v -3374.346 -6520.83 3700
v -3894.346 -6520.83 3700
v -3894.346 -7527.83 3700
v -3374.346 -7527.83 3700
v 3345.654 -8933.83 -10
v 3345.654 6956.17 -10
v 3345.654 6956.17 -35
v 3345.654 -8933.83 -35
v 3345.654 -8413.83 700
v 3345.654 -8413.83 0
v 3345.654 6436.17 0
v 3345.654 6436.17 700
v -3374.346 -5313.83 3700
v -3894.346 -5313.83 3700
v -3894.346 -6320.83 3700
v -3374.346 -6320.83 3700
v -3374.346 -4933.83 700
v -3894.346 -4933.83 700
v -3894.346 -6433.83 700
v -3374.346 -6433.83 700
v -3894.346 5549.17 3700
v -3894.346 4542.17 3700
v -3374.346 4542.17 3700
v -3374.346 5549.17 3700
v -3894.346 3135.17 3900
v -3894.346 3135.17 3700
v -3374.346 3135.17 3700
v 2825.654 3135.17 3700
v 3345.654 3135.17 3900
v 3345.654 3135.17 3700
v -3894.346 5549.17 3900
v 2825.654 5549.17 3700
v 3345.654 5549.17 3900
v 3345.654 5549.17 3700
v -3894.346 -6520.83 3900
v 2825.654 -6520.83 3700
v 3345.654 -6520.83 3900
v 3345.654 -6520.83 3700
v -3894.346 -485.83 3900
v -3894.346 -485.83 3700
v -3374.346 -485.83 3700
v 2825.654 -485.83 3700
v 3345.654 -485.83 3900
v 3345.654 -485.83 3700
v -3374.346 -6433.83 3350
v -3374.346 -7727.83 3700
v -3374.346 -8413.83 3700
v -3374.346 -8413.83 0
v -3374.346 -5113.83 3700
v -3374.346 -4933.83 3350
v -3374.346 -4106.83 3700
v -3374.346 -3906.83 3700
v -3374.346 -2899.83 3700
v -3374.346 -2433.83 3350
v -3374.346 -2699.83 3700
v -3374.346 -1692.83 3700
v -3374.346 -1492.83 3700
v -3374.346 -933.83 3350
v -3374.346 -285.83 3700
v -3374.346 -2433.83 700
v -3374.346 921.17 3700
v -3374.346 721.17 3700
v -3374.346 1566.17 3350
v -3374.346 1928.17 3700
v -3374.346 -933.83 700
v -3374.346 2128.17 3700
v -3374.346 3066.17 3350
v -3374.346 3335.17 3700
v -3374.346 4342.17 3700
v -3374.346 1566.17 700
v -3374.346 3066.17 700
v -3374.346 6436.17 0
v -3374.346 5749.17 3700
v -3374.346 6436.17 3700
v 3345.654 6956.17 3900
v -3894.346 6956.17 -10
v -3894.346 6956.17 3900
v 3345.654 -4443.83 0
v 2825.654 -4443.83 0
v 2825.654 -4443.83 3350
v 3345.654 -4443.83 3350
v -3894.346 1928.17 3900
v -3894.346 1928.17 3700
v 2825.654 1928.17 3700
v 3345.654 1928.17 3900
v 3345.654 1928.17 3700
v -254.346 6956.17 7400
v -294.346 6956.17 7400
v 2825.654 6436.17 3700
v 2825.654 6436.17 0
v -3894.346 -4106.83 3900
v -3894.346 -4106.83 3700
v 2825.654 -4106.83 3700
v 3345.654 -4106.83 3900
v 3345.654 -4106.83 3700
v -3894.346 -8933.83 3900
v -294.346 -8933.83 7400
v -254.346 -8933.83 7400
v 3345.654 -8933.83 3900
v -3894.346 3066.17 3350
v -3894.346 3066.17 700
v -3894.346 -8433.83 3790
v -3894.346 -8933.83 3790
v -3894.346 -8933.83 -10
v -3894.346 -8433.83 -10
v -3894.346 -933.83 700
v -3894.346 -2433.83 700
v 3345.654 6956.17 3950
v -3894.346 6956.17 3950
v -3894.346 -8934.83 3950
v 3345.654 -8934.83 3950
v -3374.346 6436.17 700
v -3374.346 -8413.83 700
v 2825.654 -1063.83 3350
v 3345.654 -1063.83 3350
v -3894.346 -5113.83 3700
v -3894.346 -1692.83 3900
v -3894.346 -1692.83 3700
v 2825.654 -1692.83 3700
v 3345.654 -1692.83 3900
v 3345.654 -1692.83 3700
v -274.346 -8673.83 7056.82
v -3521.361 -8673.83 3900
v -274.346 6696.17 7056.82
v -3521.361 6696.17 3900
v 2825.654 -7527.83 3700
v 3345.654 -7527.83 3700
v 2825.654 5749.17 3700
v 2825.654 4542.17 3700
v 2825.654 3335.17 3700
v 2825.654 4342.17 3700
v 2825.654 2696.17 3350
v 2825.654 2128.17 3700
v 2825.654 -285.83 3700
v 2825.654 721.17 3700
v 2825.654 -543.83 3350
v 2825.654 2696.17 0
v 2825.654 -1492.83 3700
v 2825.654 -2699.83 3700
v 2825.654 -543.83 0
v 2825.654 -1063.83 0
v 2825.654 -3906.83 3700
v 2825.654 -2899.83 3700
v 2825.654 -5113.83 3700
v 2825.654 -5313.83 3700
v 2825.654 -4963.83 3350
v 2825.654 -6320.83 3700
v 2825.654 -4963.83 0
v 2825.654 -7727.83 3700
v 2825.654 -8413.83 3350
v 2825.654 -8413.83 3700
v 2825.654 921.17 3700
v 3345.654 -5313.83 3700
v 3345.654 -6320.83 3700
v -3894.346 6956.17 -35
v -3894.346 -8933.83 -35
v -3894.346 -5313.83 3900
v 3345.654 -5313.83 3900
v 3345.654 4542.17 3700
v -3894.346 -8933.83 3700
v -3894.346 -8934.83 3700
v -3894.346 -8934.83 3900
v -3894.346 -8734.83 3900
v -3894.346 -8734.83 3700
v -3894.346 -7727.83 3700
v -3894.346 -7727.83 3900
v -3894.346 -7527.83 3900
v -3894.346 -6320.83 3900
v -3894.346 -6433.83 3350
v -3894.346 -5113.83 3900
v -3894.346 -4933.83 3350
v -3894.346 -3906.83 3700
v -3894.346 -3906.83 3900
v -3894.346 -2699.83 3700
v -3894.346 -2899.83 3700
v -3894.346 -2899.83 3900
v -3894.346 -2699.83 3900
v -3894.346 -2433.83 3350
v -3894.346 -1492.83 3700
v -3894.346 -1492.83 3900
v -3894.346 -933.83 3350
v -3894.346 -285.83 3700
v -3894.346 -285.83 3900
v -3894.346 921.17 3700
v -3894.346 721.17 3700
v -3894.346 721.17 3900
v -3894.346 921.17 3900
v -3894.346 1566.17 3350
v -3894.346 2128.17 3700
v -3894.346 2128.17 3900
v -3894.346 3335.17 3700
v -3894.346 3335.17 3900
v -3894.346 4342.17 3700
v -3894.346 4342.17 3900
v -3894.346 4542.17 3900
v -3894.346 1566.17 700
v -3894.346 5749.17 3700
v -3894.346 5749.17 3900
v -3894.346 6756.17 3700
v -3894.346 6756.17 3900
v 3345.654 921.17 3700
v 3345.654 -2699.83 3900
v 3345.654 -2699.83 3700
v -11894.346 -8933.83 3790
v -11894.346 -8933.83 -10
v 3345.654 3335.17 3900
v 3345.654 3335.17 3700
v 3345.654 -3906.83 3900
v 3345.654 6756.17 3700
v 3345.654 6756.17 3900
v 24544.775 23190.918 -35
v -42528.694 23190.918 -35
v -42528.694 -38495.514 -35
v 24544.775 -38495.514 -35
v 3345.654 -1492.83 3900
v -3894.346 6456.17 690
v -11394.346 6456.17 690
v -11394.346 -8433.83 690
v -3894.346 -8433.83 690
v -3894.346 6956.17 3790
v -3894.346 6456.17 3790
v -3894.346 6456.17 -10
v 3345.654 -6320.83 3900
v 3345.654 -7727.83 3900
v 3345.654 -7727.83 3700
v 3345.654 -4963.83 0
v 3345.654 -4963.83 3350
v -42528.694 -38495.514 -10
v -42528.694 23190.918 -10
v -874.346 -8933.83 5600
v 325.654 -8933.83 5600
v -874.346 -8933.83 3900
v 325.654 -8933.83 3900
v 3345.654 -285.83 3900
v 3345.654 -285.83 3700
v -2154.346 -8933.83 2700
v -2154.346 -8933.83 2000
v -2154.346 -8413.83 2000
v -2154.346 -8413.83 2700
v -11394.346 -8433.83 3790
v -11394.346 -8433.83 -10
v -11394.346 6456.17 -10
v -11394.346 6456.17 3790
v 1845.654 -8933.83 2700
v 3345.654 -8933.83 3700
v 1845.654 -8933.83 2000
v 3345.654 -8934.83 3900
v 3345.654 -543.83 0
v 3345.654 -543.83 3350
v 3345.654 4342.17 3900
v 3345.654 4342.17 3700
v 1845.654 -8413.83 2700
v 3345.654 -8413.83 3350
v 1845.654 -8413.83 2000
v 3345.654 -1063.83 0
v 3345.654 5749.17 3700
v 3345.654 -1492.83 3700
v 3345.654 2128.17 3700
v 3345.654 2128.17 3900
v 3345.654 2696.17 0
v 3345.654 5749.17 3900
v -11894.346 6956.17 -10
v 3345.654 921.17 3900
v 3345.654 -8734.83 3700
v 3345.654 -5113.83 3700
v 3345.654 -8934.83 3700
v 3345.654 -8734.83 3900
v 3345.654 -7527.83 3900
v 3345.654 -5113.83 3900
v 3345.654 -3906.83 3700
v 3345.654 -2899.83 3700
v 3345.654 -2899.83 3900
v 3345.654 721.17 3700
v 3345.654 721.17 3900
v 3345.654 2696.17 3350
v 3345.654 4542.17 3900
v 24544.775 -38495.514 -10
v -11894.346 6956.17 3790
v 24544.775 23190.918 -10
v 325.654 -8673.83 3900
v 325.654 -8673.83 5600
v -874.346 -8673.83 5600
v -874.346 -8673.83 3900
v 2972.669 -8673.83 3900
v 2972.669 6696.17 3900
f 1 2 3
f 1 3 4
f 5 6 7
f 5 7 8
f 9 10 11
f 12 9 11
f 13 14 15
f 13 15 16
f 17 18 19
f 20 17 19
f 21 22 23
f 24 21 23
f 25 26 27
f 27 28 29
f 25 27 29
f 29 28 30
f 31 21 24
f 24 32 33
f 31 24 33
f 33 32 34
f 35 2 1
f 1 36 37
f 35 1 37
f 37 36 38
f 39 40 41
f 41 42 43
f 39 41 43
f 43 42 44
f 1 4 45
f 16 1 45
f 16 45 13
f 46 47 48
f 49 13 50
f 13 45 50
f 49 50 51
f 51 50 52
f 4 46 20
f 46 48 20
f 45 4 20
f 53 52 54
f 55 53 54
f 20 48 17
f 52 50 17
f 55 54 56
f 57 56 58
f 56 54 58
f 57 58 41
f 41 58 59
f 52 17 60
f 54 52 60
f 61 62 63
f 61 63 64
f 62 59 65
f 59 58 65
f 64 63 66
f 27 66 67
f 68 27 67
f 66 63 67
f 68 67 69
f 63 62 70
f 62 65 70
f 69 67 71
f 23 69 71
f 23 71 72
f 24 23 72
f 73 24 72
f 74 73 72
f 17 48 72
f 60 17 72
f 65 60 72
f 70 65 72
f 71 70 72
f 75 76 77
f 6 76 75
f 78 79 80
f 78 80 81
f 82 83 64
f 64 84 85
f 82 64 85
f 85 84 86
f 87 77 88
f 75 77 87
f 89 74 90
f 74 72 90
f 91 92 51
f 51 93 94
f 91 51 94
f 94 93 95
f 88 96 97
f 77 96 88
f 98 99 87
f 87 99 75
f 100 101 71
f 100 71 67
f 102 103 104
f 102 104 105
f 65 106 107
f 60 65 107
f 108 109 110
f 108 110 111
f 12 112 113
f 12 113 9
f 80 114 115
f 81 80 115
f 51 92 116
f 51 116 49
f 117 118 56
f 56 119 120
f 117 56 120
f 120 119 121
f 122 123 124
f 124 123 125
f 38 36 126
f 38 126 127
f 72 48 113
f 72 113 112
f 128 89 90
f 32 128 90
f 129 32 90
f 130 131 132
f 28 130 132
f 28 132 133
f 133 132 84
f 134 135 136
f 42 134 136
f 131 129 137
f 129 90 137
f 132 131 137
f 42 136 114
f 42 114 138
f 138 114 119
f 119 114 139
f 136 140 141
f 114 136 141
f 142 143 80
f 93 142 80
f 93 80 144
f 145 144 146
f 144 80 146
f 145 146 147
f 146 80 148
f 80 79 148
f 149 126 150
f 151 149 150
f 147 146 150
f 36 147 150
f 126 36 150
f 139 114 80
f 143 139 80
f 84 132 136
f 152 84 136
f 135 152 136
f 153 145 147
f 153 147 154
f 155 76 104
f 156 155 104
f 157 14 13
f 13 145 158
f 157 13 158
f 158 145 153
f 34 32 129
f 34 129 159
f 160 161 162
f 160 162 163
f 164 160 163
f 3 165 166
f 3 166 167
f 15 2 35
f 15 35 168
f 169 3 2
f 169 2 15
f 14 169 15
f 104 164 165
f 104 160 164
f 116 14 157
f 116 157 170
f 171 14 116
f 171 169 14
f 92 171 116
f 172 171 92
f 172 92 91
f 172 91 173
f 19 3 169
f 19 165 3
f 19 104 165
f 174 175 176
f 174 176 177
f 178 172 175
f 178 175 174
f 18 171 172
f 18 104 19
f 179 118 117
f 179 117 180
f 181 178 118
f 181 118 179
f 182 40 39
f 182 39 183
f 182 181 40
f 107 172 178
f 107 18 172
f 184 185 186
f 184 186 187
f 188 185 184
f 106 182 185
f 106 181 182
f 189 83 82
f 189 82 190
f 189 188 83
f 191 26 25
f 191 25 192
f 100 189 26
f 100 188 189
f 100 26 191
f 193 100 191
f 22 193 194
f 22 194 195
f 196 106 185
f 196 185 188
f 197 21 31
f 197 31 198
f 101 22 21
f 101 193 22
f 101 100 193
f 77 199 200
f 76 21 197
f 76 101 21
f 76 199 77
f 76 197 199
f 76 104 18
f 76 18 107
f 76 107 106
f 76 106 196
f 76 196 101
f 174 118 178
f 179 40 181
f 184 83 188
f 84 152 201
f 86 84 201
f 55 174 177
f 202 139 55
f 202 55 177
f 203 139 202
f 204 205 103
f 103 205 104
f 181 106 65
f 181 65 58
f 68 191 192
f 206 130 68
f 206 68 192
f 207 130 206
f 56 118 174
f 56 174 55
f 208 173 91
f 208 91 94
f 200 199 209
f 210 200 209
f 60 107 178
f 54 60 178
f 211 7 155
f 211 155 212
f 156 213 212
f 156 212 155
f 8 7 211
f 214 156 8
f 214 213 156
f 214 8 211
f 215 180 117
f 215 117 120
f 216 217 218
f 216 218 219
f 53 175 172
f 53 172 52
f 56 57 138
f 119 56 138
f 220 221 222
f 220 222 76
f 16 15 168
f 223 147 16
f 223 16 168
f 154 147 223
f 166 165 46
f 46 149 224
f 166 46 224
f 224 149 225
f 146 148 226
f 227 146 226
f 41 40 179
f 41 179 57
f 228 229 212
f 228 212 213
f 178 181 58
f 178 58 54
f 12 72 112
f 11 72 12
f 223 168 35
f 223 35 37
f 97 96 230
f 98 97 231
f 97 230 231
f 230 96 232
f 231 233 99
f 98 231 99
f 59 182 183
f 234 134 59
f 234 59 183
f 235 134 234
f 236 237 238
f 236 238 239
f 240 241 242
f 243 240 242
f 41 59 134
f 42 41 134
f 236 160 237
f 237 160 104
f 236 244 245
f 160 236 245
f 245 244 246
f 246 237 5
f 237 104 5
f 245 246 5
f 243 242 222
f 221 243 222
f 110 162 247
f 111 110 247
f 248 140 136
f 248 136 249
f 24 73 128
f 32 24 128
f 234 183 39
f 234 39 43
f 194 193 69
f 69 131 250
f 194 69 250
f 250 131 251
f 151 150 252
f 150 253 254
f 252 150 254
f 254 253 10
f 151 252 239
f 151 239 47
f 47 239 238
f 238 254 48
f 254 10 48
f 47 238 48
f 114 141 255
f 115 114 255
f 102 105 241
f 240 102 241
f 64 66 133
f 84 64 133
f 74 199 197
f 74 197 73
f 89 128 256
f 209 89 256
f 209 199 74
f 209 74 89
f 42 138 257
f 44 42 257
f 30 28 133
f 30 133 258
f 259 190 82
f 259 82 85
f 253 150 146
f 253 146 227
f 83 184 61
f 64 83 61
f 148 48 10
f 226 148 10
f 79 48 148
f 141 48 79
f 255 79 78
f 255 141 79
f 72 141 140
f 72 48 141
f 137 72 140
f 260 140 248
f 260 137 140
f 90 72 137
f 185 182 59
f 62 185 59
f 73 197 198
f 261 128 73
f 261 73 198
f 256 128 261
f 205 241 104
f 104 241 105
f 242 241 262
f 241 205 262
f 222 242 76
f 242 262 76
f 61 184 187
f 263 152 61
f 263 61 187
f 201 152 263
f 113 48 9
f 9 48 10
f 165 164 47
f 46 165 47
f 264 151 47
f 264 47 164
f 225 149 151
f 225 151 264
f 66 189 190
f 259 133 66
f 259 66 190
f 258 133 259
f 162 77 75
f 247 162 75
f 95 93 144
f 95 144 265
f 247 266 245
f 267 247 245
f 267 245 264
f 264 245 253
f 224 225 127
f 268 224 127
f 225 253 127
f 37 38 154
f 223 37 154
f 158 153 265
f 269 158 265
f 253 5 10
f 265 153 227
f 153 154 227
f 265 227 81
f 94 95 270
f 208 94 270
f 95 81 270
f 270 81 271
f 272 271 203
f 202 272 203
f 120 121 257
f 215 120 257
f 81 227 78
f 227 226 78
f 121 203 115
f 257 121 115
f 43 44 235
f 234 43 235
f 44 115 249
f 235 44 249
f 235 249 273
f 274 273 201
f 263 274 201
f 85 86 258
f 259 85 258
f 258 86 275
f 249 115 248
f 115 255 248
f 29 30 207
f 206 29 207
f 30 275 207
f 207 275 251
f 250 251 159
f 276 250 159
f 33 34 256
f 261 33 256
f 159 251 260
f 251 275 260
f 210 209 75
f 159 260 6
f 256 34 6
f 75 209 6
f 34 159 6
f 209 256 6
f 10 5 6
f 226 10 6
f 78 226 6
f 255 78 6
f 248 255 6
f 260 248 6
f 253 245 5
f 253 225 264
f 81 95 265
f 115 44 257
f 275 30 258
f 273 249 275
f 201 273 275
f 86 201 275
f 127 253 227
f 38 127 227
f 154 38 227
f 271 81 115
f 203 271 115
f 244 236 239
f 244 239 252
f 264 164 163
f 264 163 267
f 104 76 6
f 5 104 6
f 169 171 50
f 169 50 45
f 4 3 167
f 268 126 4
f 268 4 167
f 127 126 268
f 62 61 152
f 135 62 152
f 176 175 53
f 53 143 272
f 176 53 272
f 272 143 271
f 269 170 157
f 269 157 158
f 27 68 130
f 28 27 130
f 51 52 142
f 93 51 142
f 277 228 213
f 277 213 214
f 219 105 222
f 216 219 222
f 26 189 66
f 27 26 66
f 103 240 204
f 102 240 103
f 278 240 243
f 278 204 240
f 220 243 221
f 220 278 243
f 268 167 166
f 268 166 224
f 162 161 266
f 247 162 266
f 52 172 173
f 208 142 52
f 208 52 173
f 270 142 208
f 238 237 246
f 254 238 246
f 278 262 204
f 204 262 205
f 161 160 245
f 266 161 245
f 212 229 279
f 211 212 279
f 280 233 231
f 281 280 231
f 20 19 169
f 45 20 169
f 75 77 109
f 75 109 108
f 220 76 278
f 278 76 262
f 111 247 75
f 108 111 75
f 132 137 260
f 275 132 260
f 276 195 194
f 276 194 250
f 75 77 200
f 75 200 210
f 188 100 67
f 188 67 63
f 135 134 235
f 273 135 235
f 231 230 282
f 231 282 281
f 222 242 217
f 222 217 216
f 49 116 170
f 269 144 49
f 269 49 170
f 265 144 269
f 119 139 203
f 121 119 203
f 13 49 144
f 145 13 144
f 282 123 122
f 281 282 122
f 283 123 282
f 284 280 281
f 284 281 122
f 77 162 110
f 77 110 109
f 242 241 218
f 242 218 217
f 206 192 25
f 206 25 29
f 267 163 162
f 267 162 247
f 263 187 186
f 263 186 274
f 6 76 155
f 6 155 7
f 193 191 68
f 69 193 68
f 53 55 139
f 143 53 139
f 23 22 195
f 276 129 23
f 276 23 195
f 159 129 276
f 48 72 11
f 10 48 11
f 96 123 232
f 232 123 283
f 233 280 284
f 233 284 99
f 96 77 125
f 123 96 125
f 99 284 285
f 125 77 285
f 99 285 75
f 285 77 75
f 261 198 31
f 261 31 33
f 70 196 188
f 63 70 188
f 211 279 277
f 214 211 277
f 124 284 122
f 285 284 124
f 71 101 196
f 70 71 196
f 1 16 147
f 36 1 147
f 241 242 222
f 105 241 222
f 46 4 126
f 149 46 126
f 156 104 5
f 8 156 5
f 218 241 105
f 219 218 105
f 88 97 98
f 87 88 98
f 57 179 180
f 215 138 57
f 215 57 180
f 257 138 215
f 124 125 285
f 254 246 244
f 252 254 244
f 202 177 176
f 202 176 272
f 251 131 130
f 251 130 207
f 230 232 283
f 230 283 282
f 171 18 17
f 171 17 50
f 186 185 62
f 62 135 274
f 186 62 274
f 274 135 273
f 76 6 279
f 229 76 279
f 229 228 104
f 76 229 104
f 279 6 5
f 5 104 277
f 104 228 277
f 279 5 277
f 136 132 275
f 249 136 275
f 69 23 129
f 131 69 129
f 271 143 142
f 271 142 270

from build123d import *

# Parameters (mm, degrees)
F0_W      = 520
F0_H      = 3240
F0_H_2    = 520
F0_H_3    = 3380
F0_H_4    = 3450
F1_DEPTH  = 10
F2_DEPTH  = 3350
F3_W      = 520
F3_H      = 11110
F4_DEPTH  = 350
F5_W      = 7240
F5_H      = 200
F6_DEPTH  = 200
F7_W      = 7240
F7_H      = 15890
F8_DEPTH  = 3500
F9_SIZE2  = 3499.99999
F9_SIZE   = 3599.99999
F10_T     = 260
F11_W     = 1200
F11_H     = 1700
F12_DEPTH = 260
F13_W     = 6720
F13_H     = 14850
F14_DEPTH = 700
F15_W     = 7240
F15_H     = 15891
F16_DEPTH = 50
F17_W     = 1500
F17_H     = 2650
F18_DEPTH = 520
F19_W     = 4000
F19_H     = 700
F20_DEPTH = 520
F21_W     = 67073.4691619873
F21_H     = 61686.4318847656
F21_W_2   = 7240
F21_H_2   = 15890
F22_DEPTH = 25
F24_DEPTH = 3800
F25_W     = 7500
F25_H     = 14890
F26_DEPTH = 700


# Not quite as in the source:
# - a fillet or chamfer is up to 0.001 mm smaller than in the source, because OpenCascade refuses the exact size
# - a shell that OpenCascade refuses in one call is made with other operations: the cavity is built on its own and cut out
# - a feature names something its author has since deleted; it is built from what else it names


with BuildPart() as f1:
    # F0 (on Top) → F1 (new body)
    with BuildSketch(Plane.XY):
        Polygon((-3374.345998764, -8413.8299859681), (-3374.345998764, 6436.1700140319), (2825.654001236, 6436.1700140319), (2825.654001236, 2696.170014032), (3345.654001236, 2696.170014032), (3345.654001236, 6956.1700140319), (-3894.345998764, 6956.1700140319), (-3894.345998764, -8933.8299859681), (3345.654001236, -8933.8299859681), (3345.654001236, -8413.8299859681), (2825.654001236, -8413.8299859681), align=None)
        Polygon((2825.654001236, 6436.1700140319), (-3374.345998764, 6436.1700140319), (-3374.345998764, -8413.8299859681), (2825.654001236, -8413.8299859681), (2825.654001236, -4963.8299859681), (2825.654001236, -4443.829985968), (2825.654001236, -1063.8299859681), (2825.654001236, -543.829985968), (2825.654001236, 2696.170014032), align=None)
        with Locations((3085.654001236, 1076.170014032)):
            Rectangle(F0_W, F0_H)
        with Locations((3085.654001236, -803.829985968)):
            Rectangle(F0_W, F0_H_2)
        with Locations((3085.654001236, -2753.829985968)):
            Rectangle(F0_W, F0_H_3)
        with Locations((3085.654001236, -6688.8299859681)):
            Rectangle(F0_W, F0_H_4)
        with Locations((3085.654001236, -4703.8299859681)):
            Rectangle(F0_W, F0_H_2)
    extrude(amount=-F1_DEPTH)

    # F0 (on Top) → F2 (join)
    with BuildSketch(Plane.XY):
        with Locations((3085.654001236, -803.829985968)):
            Rectangle(F0_W, F0_H_2)
        with Locations((3085.654001236, -4703.8299859681)):
            Rectangle(F0_W, F0_H_2)
        Polygon((-3374.345998764, -8413.8299859681), (-3374.345998764, 6436.1700140319), (2825.654001236, 6436.1700140319), (2825.654001236, 2696.170014032), (3345.654001236, 2696.170014032), (3345.654001236, 6956.1700140319), (-3894.345998764, 6956.1700140319), (-3894.345998764, -8933.8299859681), (3345.654001236, -8933.8299859681), (3345.654001236, -8413.8299859681), (2825.654001236, -8413.8299859681), align=None)
    extrude(amount=F2_DEPTH)

    # F3 (on face) → F4 (join)
    with BuildSketch(Plane.XY.offset(3350)):
        Polygon((3345.654001236, 6956.1700140319), (-3894.345998764, 6956.1700140319), (-3894.345998764, -8933.8299859681), (3345.654001236, -8933.8299859681), (3345.654001236, -8413.8299859681), (2825.654001236, -8413.8299859681), (-3374.345998764, -8413.8299859681), (-3374.345998764, 6436.1700140319), (2825.654001236, 6436.1700140319), (2825.654001236, 2696.170014032), (3345.654001236, 2696.170014032), align=None)
        with Locations((3085.654001236, -2858.8299859681)):
            Rectangle(F3_W, F3_H)
    extrude(amount=F4_DEPTH)

    # F5 (on face) → F6 (join)
    with BuildSketch(Plane.XY.offset(3700)):
        with Locations((-274.345998764, 6856.1700140319)):
            Rectangle(F5_W, F5_H)
        with Locations((-274.345998764, 5649.1700140319)):
            Rectangle(F5_W, F5_H)
        with Locations((-274.345998764, 4442.1700140319)):
            Rectangle(F5_W, F5_H)
        with Locations((-274.345998764, 3235.1700140319)):
            Rectangle(F5_W, F5_H)
        with Locations((-274.345998764, 2028.1700140319)):
            Rectangle(F5_W, F5_H)
        with Locations((-274.345998764, 821.1700140319)):
            Rectangle(F5_W, F5_H)
        with Locations((-274.345998764, -385.8299859681)):
            Rectangle(F5_W, F5_H)
        with Locations((-274.345998764, -1592.8299859681)):
            Rectangle(F5_W, F5_H)
        with Locations((-274.345998764, -2799.8299859681)):
            Rectangle(F5_W, F5_H)
        with Locations((-274.345998764, -4006.8299859681)):
            Rectangle(F5_W, F5_H)
        with Locations((-274.345998764, -5213.8299859681)):
            Rectangle(F5_W, F5_H)
        with Locations((-274.345998764, -6420.8299859681)):
            Rectangle(F5_W, F5_H)
        with Locations((-274.345998764, -7627.8299859681)):
            Rectangle(F5_W, F5_H)
        with Locations((-274.345998764, -8834.8299859681)):
            Rectangle(F5_W, F5_H)
    extrude(amount=F6_DEPTH)

    # F17 (on face) → F18 (cut)
    with BuildSketch(Plane(origin=(-3894.345998764, 0, 0), x_dir=(0, -1, 0), z_dir=(-1, 0, 0))):
        with Locations((5683.8299859681, 2025)):
            Rectangle(F17_W, F17_H)
        with Locations((1683.8299859681, 2025)):
            Rectangle(F17_W, F17_H)
        with Locations((-2316.1700140319, 2025)):
            Rectangle(F17_W, F17_H)
    extrude(amount=-F18_DEPTH, mode=Mode.SUBTRACT)

    # F19 (on face) → F20 (cut)
    with BuildSketch(Plane.XZ.offset(8933.8299859681)):
        with Locations((-154.345998764, 2350)):
            Rectangle(F19_W, F19_H)
    extrude(amount=-F20_DEPTH, mode=Mode.SUBTRACT)


with BuildPart() as f8:
    # F7 (on face) → F8 (new body)
    with BuildSketch(Plane.XY.offset(3900)):
        with Locations((-274.345998764, -988.8299859681)):
            Rectangle(F7_W, F7_H)
    extrude(amount=F8_DEPTH)

    # F9 (size 3600 and 3500 in the source; OpenCascade refuses exactly that, so slightly less here)
    f9_edges = [f8.edges().sort_by_distance(p)[0] for p in [
        (-3894.345999, -988.829986, 7400),
        (3345.654001, -988.829986, 7400),
    ]]
    f9_side = f8.faces().sort_by_distance((-274.345999, -988.829986, 7400))[0]
    chamfer(f9_edges, length=F9_SIZE, length2=F9_SIZE2, reference=f9_side)

    # F10: shell of thickness 260, made by hand


with BuildPart() as f10_core1:
    # F10_t2: copy of F8
    add(f8.part)

    # the walls: a layer under each face that stays
    f10_faces = [f10_core1.faces().sort_by_distance(p)[0] for p in [
        (-274.3459987642, -8933.8299859681, 5650.0000000001),
        (-3894.345998764, -988.8299859681, 3900.0000050002),
        (-2094.3460037642, -988.8299859681, 5650.0000050002),
        (-274.345998764, -988.8299859681, 7400),
        (3345.654001236, -988.8299859681, 3900.0000050002),
        (1545.6540062361, -988.8299859681, 5650.0000050002),
        (-274.3459987639, 6956.1700140319, 5650.0000000001),
    ]]
    thicken(f10_faces, amount=-F10_T, mode=Mode.SUBTRACT)


with BuildPart() as f8_1:
    add(f8.part)

    # what is left inside the walls is the cavity
    f10_cavity = [f10_core1.part.solids().sort_by_distance(p)[0] for p in [
        (-274.345999, -3550.496653, 3902.6),
    ]]
    add(f10_cavity, mode=Mode.SUBTRACT)

    # F11 (on face) → F12 (cut)
    with BuildSketch(Plane.XZ.offset(8933.8299859681)):
        with Locations((-274.345998764, 4750)):
            Rectangle(F11_W, F11_H)
    extrude(amount=-F12_DEPTH, mode=Mode.SUBTRACT)


with BuildPart() as f14:
    # F13 (on face) → F14 (new body)
    with BuildSketch(Plane.XY):
        with Locations((-14.345998764, -988.8299859681)):
            Rectangle(F13_W, F13_H)
    extrude(amount=F14_DEPTH)


with BuildPart() as f16:
    # F15 (on face) → F16 (new body)
    with BuildSketch(Plane.XY.offset(3900)):
        with Locations((-274.345998764, -989.3299859681)):
            Rectangle(F15_W, F15_H)
    extrude(amount=F16_DEPTH)


with BuildPart() as f22:
    # F21 (on face) → F22 (new body)
    with BuildSketch(Plane(origin=(0, 0, -10), x_dir=(1, 0, 0), z_dir=(0, 0, -1))):
        with Locations((-8991.9595718384, 7652.2979736328)):
            Rectangle(F21_W, F21_H)
        with Locations((-274.345998764, 988.8299859681)):
            Rectangle(F21_W_2, F21_H_2, mode=Mode.SUBTRACT)
    extrude(amount=F22_DEPTH)


with BuildPart() as f24:
    # F23 (on face) → F24 (new body)
    with BuildSketch(Plane.XY.offset(-10)):
        Polygon((-3894.345998764, 6456.1700140319), (-3894.345998764, 6956.1700140319), (-11894.345998764, 6956.1700140319), (-11894.345998764, -8933.8299859681), (-3894.345998764, -8933.8299859681), (-3894.345998764, -8433.8299859681), (-11394.345998764, -8433.8299859681), (-11394.345998764, 6456.1700140319), align=None)
    extrude(amount=F24_DEPTH)


with BuildPart() as f26:
    # F25 (on face) → F26 (new body)
    with BuildSketch(Plane.XY.offset(-10)):
        with Locations((-7644.345998764, -988.8299859681)):
            Rectangle(F25_W, F25_H)
    extrude(amount=F26_DEPTH)


solid = Compound([f1.part, f8_1.part, f14.part, f16.part, f22.part, f24.part, f26.part])
